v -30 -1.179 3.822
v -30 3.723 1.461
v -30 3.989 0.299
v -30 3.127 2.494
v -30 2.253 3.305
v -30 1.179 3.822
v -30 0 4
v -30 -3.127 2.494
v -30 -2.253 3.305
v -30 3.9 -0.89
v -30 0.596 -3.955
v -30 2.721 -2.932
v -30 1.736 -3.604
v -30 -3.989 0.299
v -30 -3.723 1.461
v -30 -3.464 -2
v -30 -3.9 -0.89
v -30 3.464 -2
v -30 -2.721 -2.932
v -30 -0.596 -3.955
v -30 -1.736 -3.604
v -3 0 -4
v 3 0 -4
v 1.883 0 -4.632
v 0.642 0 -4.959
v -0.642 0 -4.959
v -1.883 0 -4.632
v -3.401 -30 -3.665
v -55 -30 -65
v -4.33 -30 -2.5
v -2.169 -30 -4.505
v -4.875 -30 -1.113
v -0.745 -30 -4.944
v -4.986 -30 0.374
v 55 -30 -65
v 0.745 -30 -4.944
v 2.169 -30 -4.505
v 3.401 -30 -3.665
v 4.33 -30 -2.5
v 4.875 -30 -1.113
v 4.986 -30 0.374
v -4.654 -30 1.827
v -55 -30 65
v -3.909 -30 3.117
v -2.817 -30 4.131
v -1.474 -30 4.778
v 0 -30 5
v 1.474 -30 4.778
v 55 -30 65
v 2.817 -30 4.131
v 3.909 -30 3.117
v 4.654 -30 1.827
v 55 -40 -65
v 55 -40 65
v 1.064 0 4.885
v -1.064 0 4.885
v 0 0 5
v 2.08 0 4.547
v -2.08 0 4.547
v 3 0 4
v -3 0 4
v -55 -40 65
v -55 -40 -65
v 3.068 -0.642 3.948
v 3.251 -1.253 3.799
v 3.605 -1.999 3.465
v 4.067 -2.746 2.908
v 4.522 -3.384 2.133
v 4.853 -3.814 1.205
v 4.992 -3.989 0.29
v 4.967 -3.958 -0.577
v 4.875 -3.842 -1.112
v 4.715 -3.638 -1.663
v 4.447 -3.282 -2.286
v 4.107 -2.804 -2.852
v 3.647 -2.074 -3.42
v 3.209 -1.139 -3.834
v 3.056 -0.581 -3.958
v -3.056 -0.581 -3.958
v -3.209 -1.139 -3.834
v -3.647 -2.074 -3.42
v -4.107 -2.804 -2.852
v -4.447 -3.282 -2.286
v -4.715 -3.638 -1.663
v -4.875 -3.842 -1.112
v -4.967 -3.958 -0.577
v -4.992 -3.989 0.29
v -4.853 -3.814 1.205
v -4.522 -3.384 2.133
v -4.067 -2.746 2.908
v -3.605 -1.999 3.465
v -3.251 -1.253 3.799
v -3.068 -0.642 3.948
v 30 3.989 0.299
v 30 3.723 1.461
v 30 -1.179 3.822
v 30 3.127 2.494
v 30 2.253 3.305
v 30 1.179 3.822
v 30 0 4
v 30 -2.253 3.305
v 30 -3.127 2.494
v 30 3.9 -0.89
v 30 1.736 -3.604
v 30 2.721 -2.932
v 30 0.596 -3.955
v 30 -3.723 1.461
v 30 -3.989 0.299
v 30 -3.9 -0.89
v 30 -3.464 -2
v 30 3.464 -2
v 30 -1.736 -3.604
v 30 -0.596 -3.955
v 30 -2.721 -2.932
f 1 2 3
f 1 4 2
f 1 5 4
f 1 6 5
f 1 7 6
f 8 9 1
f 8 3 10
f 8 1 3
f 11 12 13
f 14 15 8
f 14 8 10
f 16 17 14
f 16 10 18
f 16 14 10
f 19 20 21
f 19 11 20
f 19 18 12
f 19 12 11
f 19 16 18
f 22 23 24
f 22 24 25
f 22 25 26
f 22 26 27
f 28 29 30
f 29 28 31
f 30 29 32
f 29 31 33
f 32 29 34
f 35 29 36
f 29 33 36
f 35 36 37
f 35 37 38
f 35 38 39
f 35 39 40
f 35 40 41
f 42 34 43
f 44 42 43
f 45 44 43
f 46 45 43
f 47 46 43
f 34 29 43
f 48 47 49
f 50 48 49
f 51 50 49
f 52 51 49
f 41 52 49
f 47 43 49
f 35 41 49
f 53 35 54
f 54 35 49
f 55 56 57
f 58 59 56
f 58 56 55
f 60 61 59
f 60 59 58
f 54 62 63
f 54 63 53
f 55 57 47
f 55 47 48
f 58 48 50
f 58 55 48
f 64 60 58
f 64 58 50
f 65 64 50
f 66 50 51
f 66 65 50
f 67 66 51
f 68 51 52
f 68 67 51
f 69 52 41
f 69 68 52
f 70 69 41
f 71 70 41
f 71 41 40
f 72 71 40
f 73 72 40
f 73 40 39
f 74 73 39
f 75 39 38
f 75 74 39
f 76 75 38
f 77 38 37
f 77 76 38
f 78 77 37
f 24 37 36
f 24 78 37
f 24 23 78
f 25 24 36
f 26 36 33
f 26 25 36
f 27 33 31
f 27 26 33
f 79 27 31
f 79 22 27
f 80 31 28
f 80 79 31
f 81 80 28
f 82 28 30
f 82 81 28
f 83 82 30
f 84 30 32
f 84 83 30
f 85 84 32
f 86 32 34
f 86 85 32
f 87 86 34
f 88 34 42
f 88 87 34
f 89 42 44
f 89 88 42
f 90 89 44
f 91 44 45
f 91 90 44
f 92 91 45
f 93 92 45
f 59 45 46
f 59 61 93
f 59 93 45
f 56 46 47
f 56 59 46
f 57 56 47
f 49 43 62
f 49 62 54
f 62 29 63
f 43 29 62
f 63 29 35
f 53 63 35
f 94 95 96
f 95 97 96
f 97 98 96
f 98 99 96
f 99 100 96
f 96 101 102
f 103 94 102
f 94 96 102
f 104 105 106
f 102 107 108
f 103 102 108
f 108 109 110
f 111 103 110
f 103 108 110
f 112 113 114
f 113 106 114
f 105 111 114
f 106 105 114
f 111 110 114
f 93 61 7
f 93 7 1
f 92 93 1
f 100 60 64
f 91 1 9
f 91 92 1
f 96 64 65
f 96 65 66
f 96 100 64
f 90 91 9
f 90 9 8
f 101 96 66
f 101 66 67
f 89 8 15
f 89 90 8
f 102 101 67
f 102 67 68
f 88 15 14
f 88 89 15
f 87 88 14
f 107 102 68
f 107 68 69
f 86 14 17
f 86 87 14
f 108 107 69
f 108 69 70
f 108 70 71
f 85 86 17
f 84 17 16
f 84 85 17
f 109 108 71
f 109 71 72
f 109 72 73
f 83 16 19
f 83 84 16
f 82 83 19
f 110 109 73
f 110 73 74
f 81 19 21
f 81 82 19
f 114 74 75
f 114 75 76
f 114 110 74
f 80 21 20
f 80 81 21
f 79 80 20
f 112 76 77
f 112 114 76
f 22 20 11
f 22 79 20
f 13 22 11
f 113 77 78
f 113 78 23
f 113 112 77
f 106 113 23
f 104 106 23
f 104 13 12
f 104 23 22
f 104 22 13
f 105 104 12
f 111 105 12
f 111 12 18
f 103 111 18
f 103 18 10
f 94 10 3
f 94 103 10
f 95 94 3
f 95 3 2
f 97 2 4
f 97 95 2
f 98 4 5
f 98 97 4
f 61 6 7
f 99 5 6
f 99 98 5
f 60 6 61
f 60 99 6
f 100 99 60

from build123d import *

# Parameters (mm, degrees)
SKETCH_1_W      = 60
SKETCH_1_H      = 4
SKETCH_3_R      = 5
EXTRUDE_2_DEPTH = 30
SKETCH_5_W      = 110
SKETCH_5_H      = 130
EXTRUDE_3_DEPTH = 10


with BuildPart() as part:
    # 草图1 → 旋转3 (revolve)
    with BuildSketch(Plane(origin=(0, 0, 0), x_dir=(1, 0, 0), z_dir=(0, 1, 0)), mode=Mode.PRIVATE) as revolve_3_sk:
        with Locations((0, 2)):
            Rectangle(SKETCH_1_W, SKETCH_1_H)
    revolve(revolve_3_sk.sketch.rotate(Axis((-30, 0, 0), (1, 0, 0)), 180), axis=Axis((-30, 0, 0), (1, 0, 0)))

    # 草图3 → 凸台-拉伸2 (add)
    with BuildSketch(Plane(origin=(0, 0, 0), x_dir=(1, 0, 0), z_dir=(0, 1, 0))):
        with Locations(Location((0, 0, 0), (0, 0, 270))):
            Circle(SKETCH_3_R)
    extrude(amount=-EXTRUDE_2_DEPTH)

    # 草图5 → 凸台-拉伸3 (add)
    with BuildSketch(Plane.XZ.offset(30)):
        Rectangle(SKETCH_5_W, SKETCH_5_H)
    extrude(amount=EXTRUDE_3_DEPTH)


solid = part.part
